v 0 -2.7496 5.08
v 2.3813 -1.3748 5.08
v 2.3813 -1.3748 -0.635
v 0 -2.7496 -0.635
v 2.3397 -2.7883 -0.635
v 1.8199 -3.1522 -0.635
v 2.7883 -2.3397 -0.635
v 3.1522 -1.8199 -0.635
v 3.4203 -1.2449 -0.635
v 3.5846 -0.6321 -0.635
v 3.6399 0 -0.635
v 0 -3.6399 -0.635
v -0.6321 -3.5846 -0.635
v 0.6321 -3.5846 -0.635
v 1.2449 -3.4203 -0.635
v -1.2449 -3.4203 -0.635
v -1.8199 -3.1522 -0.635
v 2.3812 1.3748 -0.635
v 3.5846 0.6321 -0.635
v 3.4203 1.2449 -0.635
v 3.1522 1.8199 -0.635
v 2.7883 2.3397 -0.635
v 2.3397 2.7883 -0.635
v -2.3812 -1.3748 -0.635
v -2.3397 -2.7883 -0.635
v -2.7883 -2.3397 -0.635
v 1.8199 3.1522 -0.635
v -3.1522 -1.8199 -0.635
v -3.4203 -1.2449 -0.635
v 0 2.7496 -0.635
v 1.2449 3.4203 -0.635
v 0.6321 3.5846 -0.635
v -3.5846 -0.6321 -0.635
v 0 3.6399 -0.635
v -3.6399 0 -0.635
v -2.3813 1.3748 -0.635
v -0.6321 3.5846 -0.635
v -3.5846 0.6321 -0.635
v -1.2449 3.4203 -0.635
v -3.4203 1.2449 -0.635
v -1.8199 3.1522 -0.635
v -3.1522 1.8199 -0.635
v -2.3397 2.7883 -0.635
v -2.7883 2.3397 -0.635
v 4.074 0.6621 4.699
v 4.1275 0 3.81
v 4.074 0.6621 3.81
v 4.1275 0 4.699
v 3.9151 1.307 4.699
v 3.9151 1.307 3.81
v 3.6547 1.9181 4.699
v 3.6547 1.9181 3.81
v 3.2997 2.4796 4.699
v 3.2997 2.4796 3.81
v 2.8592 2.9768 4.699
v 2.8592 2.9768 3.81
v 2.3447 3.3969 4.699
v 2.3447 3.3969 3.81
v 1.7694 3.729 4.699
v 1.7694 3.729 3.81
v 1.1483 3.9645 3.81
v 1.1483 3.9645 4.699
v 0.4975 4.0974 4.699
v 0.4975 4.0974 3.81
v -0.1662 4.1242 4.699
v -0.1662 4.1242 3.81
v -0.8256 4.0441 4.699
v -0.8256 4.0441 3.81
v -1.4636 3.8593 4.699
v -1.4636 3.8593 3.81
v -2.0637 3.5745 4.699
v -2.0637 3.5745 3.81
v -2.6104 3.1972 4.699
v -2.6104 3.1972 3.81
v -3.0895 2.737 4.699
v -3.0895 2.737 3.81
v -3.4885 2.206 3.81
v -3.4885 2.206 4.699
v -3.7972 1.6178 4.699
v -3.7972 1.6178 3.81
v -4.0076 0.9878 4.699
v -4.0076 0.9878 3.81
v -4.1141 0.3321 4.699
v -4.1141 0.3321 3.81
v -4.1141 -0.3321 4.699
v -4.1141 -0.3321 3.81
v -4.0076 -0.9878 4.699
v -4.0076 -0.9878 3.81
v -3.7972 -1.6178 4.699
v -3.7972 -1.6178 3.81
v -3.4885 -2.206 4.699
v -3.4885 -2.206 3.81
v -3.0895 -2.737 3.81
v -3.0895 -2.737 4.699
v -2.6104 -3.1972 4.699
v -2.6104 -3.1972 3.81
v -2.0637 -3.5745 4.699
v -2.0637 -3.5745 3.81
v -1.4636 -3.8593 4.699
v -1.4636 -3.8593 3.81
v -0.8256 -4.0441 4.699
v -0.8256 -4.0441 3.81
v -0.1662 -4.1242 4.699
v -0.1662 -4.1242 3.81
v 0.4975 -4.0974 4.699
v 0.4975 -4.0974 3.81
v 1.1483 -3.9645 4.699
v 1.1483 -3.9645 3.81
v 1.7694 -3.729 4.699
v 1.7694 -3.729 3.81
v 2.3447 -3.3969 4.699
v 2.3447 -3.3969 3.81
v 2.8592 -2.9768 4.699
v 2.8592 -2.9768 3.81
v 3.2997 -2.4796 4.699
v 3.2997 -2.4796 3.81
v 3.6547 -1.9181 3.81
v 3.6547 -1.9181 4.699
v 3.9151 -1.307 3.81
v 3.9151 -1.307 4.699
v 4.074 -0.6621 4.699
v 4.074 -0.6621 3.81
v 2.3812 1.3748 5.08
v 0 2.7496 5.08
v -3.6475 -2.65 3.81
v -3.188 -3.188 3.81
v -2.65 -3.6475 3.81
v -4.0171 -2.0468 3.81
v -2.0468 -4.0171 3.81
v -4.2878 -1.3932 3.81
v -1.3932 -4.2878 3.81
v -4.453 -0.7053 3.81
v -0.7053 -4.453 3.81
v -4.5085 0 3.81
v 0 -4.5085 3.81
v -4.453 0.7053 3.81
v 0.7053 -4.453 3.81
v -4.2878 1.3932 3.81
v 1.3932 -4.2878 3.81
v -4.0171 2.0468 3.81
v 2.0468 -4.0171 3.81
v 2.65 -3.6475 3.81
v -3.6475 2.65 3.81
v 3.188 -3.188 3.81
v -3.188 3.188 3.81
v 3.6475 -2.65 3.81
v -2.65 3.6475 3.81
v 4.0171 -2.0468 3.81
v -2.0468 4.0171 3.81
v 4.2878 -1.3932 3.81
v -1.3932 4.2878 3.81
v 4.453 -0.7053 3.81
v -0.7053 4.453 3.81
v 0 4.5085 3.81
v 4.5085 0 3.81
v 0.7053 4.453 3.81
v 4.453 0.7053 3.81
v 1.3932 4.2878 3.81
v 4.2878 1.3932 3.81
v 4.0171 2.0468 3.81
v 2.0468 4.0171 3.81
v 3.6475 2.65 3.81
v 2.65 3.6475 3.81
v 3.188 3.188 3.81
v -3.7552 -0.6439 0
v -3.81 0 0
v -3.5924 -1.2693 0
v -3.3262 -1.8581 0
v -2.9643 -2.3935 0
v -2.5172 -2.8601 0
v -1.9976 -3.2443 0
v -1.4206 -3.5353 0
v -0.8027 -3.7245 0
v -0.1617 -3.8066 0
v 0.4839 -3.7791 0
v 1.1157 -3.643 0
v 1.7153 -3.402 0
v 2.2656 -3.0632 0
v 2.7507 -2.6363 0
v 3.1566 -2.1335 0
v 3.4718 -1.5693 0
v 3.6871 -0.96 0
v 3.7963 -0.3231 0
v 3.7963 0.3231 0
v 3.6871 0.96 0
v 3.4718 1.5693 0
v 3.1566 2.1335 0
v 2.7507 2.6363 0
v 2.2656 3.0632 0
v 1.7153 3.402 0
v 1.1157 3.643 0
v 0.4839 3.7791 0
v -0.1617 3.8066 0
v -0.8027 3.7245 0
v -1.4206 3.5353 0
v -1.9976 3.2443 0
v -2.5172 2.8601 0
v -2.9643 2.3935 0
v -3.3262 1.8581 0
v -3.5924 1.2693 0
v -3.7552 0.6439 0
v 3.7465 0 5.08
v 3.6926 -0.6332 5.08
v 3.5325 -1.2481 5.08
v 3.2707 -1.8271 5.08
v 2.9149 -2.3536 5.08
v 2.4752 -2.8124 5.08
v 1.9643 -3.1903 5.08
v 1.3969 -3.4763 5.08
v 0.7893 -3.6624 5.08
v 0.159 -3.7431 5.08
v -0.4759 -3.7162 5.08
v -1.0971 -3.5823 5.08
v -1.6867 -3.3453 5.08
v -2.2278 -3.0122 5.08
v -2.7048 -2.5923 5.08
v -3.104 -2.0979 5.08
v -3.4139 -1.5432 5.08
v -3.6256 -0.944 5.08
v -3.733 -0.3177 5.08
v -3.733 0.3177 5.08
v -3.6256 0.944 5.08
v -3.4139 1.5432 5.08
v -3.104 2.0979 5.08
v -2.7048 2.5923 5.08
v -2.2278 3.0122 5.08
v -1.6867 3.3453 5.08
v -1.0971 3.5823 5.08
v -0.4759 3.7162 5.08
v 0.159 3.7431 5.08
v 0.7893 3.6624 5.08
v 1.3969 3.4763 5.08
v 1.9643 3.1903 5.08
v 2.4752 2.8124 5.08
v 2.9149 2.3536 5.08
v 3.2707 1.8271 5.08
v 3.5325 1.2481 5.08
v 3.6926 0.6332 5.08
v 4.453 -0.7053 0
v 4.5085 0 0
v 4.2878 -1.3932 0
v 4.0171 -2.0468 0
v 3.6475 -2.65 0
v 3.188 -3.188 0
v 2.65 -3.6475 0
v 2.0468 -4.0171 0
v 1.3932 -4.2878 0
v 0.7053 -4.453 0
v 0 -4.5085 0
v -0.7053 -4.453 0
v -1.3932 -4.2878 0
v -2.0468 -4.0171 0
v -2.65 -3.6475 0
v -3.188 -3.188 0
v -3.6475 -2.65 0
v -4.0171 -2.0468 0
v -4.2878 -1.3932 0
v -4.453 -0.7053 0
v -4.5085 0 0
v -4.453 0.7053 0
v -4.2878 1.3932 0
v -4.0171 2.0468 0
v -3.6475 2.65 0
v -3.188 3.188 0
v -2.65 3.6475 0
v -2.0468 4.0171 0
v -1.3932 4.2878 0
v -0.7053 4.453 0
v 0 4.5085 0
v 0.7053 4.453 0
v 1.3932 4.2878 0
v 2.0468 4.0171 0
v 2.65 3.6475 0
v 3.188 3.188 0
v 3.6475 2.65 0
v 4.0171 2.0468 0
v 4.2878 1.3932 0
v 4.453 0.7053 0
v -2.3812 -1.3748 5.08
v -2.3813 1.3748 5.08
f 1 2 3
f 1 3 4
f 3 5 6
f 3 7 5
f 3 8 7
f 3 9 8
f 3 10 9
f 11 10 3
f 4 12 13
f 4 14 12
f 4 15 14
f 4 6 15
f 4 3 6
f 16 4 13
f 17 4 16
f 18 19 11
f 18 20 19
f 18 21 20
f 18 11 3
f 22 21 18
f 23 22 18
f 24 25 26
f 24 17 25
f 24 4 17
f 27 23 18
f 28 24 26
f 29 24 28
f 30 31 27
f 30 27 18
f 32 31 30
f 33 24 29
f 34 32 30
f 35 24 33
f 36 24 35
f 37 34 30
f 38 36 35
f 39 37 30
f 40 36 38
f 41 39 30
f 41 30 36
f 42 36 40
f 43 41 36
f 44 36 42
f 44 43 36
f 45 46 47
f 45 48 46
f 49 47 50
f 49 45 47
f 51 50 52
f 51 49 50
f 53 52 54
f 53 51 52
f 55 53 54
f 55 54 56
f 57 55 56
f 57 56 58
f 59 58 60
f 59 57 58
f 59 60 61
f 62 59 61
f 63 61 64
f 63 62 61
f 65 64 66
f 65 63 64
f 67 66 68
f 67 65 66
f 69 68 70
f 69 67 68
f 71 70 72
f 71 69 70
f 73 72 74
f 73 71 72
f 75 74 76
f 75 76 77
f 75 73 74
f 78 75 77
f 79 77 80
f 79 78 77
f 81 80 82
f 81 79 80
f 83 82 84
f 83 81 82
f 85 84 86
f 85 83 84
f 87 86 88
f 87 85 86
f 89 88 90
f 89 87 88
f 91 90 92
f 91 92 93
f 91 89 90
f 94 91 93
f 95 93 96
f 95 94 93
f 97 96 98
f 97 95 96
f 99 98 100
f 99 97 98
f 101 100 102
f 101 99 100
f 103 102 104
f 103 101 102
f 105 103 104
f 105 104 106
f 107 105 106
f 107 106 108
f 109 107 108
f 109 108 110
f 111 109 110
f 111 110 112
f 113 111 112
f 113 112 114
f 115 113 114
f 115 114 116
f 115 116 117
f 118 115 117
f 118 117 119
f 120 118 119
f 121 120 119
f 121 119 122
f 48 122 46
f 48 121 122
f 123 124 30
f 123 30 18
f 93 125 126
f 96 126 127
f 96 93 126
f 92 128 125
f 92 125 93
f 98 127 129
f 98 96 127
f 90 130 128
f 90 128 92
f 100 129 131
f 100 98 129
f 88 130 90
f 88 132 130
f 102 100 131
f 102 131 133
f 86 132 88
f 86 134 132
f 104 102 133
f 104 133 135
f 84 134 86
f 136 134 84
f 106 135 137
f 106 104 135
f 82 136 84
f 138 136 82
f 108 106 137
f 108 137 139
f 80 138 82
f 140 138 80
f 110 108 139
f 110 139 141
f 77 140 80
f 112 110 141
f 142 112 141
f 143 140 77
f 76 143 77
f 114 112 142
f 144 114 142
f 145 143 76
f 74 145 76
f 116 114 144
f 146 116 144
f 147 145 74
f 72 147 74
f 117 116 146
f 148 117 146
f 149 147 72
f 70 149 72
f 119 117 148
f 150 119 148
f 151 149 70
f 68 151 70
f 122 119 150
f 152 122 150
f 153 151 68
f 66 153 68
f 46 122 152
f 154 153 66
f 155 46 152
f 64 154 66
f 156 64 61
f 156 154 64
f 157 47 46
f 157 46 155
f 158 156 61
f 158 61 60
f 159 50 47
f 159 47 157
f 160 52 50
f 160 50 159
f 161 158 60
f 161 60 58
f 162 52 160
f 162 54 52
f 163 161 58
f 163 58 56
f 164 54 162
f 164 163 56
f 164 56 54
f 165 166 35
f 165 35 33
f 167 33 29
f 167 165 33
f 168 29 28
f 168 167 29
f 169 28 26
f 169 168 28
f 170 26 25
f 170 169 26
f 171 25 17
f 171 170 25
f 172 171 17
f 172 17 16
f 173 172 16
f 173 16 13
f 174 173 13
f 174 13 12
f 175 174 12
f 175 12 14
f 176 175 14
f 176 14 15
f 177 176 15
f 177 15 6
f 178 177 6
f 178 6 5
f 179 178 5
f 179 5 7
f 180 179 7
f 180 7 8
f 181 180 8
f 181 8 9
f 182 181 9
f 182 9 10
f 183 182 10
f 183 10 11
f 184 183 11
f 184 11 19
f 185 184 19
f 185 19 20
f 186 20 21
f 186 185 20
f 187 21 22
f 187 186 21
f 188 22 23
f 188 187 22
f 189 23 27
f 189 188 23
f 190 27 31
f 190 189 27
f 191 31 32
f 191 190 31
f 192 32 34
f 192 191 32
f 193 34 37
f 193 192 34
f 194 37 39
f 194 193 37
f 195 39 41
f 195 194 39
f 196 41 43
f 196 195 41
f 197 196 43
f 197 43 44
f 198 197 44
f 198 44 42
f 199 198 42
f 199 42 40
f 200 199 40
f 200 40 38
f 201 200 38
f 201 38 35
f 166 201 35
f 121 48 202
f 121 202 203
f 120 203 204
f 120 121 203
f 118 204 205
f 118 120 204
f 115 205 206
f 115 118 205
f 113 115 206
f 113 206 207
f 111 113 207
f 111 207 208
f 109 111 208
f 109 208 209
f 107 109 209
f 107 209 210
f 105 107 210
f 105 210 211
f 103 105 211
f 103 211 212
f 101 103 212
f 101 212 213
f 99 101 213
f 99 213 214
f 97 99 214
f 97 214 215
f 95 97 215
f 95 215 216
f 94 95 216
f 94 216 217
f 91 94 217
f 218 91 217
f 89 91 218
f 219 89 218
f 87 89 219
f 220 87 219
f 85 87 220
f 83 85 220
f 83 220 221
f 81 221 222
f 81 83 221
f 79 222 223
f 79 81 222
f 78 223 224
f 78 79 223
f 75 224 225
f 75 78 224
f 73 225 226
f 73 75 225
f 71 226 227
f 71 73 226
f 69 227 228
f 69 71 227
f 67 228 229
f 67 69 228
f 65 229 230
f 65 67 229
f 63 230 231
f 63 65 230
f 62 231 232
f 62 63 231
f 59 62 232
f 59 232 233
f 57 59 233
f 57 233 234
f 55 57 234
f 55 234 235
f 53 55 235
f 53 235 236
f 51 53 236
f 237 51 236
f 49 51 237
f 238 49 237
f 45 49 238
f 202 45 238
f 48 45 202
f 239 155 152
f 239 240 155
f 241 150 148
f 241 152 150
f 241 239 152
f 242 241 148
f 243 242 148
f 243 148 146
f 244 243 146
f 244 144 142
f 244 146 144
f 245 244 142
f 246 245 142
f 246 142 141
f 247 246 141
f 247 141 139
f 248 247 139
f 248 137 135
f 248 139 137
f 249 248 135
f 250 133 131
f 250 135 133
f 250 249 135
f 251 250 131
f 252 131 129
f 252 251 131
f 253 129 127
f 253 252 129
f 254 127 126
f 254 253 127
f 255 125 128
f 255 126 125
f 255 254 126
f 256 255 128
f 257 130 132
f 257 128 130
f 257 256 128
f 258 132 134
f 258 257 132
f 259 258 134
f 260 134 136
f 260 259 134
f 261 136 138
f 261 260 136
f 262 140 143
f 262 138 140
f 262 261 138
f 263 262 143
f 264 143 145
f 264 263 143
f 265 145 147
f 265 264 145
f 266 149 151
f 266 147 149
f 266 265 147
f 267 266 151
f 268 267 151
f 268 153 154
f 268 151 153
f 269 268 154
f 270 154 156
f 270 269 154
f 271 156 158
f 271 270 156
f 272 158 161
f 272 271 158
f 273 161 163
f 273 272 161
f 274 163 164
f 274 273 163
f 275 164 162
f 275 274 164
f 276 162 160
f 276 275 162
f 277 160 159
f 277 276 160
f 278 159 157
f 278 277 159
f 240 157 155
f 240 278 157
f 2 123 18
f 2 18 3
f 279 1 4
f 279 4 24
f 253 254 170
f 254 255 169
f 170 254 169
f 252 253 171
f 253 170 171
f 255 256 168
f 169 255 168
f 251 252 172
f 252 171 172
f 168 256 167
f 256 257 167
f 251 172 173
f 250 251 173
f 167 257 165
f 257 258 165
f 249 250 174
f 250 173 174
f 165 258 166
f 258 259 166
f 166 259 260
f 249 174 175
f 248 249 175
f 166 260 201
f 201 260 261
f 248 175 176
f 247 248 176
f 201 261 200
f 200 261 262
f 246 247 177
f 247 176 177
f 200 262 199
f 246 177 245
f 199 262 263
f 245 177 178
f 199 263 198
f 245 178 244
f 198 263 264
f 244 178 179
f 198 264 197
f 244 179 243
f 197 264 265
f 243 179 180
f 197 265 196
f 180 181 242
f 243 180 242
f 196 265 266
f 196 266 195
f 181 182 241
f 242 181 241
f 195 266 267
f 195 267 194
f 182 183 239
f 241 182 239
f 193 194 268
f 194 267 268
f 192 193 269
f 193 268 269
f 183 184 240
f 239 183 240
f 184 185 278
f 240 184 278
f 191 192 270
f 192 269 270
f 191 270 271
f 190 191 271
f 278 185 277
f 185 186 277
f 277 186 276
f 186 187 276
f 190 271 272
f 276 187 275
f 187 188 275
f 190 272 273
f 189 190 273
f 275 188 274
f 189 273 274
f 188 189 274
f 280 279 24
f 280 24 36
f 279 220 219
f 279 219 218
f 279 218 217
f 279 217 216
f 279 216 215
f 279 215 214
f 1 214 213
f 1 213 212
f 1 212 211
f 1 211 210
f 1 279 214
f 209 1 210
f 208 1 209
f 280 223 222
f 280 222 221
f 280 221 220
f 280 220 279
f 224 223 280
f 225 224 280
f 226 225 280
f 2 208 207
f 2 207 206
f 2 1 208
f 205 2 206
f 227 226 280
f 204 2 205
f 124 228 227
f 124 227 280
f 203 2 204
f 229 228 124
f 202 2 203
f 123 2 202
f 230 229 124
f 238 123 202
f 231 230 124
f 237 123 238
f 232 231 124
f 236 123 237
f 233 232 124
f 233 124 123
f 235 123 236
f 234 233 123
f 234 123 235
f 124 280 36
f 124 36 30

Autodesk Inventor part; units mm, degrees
ref_plane "YZ Plane" through (0, 0, 0) normal (1, 0, 0) x (0, 1, 0)
ref_plane "XZ Plane" through (0, 0, 0) normal (0, 1, 0) x (-1, 0, 0)
ref_plane "XY Plane" through (0, 0, 0) normal (0, 0, 1) x (1, 0, 0)
sketch "Sketch1" plane through (0, 0, 0) normal (0, 0, 1) x (1, 0, 0)
  circle A0 centre (0, 0) radius 4.5085
  dimension "d0" = 9.017
extrude "Extrusion1" add sketch "Sketch1" along normal blind 5.08
sketch "Sketch2" plane through (0, 0, 0) normal (0, 0, -1) x (-1, 0, 0)
  circle A0 centre (0, 0) radius 3.81
  dimension "d3" = 7.62
extrude "Extrusion2" add sketch "Sketch2" along normal blind 0.635 draft -15
sketch "Sketch3" plane through (0, 0, 5.08) normal (0, 0, 1) x (1, 0, 0)
  circle A0 centre (0, 0) radius 4.1275
  circle A1 centre (0, 0) radius 4.5085 projected
  dimension "d6" = 8.255
extrude "Extrusion3" cut sketch "Sketch3" against normal blind 1.27
chamfer "Chamfer1" distance 0.381 angle 45 1 edges at (-4.1275, 0, 5.08)
sketch "Sketch4" plane through (0, 0, 5.08) normal (0, 0, 1) x (1, 0, 0)
  circle A0 centre (0, 0) radius 2.3813 construction
  line L0 (-2.3813, 1.3748) -> (0, 2.7496)
  line L1 (0, 2.7496) -> (2.3812, 1.3748)
  line L2 (2.3812, 1.3748) -> (2.3813, -1.3748)
  line L3 (2.3813, -1.3748) -> (0, -2.7496)
  line L4 (0, -2.7496) -> (-2.3812, -1.3748)
  line L5 (-2.3812, -1.3748) -> (-2.3813, 1.3748)
  point P0 (-2.3813, 0)
  dimension "d12" = 4.7625
extrude "Extrusion4" cut sketch "Sketch4" against normal through all
thread "Thread1" size "3/8-36 UNS" class "2A" standard "ANSI Unified Screw Threads" full length
properties part number "Pillow Ball Retainer"
